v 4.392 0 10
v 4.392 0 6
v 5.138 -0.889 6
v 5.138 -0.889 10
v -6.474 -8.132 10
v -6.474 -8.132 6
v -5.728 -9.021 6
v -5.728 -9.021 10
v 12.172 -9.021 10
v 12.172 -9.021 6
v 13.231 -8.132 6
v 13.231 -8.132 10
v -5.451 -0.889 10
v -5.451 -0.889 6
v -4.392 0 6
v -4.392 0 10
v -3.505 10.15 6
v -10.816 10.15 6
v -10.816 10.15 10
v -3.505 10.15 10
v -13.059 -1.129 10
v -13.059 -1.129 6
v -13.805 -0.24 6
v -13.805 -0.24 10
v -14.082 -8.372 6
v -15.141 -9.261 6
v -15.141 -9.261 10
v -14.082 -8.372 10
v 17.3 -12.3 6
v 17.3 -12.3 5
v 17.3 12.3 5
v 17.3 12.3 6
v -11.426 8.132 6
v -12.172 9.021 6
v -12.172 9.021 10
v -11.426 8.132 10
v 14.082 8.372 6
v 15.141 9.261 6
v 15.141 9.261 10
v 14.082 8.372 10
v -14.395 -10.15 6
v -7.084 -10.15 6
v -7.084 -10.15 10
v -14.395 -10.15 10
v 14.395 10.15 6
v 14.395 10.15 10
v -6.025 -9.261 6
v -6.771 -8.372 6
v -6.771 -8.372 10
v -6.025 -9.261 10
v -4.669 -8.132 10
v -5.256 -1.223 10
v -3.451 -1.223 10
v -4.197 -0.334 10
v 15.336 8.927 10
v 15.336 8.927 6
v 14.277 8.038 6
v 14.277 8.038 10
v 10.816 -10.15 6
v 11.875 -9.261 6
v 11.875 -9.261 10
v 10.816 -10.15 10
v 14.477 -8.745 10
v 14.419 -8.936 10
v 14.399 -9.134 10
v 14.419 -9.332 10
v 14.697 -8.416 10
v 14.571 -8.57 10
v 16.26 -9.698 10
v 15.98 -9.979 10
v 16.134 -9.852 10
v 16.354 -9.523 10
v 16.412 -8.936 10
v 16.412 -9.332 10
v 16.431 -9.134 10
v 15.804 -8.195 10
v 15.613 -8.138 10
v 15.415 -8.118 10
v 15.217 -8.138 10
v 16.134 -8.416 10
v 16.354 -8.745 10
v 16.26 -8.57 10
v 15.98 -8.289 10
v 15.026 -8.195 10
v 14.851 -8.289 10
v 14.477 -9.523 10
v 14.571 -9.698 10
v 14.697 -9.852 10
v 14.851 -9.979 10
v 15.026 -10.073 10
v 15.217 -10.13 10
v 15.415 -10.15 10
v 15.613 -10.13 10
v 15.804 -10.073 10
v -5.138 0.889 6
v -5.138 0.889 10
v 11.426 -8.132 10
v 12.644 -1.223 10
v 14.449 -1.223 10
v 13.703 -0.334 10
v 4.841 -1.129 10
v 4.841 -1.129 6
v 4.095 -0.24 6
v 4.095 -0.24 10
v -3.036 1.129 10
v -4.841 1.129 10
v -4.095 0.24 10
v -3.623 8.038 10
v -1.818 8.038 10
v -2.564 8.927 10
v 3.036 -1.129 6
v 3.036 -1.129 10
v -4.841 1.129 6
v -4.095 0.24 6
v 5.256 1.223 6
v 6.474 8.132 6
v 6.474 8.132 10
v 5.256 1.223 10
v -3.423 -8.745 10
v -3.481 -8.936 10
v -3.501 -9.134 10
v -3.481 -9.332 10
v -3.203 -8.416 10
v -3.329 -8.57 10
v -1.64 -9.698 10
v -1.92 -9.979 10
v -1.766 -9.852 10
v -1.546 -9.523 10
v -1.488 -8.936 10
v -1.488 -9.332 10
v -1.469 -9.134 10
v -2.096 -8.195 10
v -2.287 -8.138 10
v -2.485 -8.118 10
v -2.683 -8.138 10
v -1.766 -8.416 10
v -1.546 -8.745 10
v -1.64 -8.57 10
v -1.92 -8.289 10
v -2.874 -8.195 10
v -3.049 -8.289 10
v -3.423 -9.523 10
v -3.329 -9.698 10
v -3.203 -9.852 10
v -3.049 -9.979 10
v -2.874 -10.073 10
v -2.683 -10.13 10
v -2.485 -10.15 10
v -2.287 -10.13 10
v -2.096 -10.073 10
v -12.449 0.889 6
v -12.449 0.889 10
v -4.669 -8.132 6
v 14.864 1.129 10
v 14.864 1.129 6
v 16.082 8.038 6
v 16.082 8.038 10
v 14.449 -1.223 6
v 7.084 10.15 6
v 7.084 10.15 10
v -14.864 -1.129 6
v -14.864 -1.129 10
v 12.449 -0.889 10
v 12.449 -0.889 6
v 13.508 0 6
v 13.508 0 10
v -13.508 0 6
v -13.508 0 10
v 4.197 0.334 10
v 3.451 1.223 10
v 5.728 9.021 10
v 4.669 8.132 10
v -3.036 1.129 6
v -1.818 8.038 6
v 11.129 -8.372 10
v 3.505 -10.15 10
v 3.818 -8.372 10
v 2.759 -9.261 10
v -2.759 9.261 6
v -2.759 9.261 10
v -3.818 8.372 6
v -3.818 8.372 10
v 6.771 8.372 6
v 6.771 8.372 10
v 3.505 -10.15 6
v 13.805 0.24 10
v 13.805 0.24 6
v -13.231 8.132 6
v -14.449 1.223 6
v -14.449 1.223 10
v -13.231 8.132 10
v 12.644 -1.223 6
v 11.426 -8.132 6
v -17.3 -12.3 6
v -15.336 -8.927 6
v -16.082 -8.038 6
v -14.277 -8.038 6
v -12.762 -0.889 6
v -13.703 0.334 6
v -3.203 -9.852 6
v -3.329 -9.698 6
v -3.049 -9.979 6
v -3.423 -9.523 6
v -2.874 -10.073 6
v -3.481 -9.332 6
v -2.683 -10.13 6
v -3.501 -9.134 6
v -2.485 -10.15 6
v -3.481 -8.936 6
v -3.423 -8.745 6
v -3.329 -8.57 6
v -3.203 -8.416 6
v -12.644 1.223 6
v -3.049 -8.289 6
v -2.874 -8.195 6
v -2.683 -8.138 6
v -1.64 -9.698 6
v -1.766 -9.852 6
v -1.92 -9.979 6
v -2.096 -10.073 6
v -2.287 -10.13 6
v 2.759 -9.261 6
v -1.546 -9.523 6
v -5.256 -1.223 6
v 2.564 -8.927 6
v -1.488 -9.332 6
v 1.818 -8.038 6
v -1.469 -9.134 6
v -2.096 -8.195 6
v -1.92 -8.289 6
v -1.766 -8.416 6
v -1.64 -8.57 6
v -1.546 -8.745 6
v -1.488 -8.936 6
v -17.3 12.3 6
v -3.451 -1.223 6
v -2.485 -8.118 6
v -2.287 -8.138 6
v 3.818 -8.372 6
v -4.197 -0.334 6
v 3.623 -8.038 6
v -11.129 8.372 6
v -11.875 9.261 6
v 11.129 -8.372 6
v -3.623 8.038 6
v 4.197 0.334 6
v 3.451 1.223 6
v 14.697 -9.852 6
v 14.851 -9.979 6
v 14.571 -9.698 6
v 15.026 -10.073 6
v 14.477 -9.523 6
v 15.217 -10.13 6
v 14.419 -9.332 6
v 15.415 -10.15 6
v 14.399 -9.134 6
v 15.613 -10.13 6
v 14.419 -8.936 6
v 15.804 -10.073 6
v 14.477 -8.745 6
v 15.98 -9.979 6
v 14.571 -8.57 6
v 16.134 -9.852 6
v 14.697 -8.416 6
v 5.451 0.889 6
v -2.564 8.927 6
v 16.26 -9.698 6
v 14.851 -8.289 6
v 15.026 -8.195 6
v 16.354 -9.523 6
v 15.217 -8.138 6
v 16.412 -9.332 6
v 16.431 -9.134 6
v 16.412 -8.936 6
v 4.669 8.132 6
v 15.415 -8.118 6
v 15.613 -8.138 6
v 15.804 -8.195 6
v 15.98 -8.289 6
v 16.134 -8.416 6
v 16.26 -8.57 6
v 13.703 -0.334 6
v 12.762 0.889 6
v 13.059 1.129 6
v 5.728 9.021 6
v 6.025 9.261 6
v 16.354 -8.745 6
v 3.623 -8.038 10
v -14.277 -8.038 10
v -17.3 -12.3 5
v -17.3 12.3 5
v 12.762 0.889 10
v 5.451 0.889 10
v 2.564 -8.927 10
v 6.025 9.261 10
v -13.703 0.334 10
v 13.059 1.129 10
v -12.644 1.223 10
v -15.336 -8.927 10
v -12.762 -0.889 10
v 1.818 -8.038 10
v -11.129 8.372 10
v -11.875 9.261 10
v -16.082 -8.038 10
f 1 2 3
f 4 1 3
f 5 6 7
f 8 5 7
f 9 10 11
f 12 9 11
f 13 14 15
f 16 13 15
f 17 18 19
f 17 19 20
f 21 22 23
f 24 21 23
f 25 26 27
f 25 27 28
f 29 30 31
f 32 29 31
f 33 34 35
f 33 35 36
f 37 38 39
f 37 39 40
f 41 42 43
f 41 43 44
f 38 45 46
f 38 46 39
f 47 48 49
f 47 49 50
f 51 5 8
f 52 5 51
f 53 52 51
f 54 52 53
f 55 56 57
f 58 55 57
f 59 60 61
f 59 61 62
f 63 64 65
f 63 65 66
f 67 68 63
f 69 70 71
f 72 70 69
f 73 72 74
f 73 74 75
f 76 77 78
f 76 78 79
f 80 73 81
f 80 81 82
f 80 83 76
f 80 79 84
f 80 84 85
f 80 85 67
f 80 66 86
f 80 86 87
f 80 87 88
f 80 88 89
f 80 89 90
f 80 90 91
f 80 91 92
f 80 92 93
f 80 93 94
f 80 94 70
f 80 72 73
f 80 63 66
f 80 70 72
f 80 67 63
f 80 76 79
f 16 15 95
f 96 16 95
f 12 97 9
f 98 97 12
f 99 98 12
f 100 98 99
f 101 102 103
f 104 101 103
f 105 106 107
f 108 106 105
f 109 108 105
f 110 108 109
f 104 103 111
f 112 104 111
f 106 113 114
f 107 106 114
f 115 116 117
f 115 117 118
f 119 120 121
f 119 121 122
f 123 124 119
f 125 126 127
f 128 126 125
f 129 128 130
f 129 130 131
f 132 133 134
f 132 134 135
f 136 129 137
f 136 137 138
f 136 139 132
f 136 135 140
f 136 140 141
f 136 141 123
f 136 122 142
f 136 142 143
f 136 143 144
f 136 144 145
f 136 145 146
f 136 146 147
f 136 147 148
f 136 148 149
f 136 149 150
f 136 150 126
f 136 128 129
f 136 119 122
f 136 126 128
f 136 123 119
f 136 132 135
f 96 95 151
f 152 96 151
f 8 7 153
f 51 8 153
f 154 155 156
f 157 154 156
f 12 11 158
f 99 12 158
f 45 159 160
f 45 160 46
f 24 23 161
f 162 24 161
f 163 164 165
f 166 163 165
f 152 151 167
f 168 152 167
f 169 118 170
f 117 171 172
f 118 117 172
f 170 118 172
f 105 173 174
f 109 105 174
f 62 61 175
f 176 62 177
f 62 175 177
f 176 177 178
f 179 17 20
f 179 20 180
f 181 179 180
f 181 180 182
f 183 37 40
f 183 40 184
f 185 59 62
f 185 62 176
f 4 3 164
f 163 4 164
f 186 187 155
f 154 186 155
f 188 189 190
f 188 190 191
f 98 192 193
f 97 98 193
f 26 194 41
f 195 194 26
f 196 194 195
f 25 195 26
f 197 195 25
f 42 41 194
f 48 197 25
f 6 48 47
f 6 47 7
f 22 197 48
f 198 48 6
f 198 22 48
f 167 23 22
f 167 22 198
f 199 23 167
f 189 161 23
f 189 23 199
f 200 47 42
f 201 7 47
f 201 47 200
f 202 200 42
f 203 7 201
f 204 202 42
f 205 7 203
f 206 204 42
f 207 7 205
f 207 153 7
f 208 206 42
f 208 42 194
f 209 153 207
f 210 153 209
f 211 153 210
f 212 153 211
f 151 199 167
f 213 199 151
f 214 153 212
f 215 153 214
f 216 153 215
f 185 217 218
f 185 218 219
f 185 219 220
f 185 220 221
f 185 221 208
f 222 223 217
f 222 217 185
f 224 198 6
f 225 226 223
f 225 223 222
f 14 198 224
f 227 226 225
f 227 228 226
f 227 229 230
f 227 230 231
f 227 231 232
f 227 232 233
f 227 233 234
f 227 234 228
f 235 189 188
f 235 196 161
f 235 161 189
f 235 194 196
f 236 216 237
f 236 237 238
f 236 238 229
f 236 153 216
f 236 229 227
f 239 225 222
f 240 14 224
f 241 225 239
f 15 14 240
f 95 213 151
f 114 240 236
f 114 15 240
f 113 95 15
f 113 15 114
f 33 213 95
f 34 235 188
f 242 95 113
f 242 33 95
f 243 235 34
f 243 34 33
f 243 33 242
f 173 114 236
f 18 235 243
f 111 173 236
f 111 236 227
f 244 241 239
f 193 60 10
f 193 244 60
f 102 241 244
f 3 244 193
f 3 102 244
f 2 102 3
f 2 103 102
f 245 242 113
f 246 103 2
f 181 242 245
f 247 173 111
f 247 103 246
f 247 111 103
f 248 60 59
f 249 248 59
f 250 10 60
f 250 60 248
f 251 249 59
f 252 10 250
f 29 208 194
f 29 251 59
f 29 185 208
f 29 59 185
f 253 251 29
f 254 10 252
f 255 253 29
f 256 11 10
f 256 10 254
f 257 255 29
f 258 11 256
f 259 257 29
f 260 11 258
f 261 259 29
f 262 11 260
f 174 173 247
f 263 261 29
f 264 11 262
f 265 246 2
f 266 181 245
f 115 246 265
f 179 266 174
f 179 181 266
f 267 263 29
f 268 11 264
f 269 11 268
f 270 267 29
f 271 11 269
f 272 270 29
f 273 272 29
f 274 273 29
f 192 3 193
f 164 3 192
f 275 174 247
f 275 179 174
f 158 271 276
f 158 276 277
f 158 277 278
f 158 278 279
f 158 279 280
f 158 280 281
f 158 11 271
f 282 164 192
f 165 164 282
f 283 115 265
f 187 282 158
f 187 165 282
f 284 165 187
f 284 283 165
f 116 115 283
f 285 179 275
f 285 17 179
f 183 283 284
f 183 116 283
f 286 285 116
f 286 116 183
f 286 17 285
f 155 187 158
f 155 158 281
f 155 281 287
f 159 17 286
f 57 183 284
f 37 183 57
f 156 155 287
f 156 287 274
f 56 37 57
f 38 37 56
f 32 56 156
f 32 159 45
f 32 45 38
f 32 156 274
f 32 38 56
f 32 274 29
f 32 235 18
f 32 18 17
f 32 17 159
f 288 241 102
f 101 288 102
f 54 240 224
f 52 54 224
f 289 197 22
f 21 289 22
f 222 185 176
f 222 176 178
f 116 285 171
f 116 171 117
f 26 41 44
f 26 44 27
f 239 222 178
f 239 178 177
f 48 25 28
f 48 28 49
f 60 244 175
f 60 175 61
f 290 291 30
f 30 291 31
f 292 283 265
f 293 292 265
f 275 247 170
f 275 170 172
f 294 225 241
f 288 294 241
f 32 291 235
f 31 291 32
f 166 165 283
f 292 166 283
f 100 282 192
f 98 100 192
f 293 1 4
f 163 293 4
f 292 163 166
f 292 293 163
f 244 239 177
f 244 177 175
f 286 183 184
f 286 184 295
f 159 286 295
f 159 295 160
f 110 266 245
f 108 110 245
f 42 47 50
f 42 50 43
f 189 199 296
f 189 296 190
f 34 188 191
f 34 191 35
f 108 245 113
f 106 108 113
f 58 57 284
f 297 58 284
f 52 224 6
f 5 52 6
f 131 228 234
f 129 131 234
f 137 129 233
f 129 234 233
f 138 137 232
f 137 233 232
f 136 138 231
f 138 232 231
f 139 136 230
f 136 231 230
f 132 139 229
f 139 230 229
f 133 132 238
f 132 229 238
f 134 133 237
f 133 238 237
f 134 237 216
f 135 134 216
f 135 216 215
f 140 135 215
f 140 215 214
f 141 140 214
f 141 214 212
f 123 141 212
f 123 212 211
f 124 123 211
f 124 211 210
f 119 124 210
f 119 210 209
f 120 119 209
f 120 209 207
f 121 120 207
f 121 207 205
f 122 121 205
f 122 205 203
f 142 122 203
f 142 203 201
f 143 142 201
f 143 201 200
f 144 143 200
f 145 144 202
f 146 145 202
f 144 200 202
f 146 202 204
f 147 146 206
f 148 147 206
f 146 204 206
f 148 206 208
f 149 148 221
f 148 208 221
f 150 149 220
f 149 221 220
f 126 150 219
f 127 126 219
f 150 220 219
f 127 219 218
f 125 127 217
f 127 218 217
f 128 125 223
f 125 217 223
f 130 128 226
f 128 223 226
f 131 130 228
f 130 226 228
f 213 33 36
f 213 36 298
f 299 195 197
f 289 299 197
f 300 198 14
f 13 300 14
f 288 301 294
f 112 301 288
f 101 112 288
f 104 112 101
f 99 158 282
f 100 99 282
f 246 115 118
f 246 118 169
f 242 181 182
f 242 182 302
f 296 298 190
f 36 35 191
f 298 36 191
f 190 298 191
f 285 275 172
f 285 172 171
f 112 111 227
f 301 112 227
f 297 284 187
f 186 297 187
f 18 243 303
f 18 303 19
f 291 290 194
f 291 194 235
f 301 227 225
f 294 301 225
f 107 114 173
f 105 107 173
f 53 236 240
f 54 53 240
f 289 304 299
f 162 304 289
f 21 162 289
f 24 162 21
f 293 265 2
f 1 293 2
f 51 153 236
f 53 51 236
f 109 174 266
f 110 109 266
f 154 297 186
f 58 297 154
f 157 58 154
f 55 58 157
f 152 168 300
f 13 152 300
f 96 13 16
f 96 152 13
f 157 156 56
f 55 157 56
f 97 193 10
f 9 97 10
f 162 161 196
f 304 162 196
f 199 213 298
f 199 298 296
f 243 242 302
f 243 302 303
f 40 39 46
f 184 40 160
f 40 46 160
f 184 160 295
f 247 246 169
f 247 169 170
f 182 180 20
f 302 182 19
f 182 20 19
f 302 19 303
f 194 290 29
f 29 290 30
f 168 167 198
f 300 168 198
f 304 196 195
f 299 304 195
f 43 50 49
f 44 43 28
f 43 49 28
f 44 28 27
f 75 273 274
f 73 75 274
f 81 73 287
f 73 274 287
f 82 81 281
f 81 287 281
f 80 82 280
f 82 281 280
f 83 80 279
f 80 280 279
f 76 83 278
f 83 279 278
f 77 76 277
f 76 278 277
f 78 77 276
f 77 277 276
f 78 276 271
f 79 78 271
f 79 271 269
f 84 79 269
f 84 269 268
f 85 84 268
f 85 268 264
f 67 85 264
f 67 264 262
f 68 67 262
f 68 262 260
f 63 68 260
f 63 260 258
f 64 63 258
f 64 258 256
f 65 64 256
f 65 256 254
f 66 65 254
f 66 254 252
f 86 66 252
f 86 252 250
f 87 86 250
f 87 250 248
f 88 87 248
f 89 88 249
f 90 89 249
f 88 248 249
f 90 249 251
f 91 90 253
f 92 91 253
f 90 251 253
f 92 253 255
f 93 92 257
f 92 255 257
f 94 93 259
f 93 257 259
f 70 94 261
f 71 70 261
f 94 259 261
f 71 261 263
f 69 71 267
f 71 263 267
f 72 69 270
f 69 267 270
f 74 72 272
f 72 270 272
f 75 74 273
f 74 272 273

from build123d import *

# Parameters (mm, degrees)
SKETCH_W            = 34.6
SKETCH_H            = 24.6
PAD001_DEPTH        = 1
SKETCH002_R         = 1.016
PAD002_DEPTH        = 5
LINEARPATTERN_COUNT = 2
LINEARPATTERN_PITCH = 17.9


with BuildPart() as part:
    # Sketch → Pad001 (new body)
    with BuildSketch(Plane.XY):
        Rectangle(SKETCH_W, SKETCH_H)
    extrude(amount=PAD001_DEPTH)

    # Sketch002 → Pad002 (join)
    with BuildSketch(Plane.XY):
        with Locations((-2.484719, -9.134)):
            Circle(SKETCH002_R)
        Polygon((-11.875322, 9.261), (-10.815853, 10.15), (-3.50471, 10.15), (-2.75875, 9.261), (-3.818219, 8.372), (-11.129362, 8.372), align=None)
        Polygon((-12.171581, 9.021337), (-11.425621, 8.132337), (-12.643997, 1.222585), (-13.703466, 0.333585), (-14.449425, 1.222585), (-13.23105, 8.132337), align=None)
        Polygon((-2.56357, 8.927415), (-3.623039, 8.038415), (-4.841415, 1.128663), (-4.095455, 0.239663), (-3.035986, 1.128663), (-1.81761, 8.038415), align=None)
        Polygon((-12.448817, 0.889), (-13.508286, 0), (-12.762326, -0.889), (-5.451183, -0.889), (-4.391714, 0), (-5.137674, 0.889), align=None)
        Polygon((-13.804545, -0.239663), (-14.864014, -1.128663), (-16.08239, -8.038415), (-15.33643, -8.927415), (-14.276961, -8.038415), (-13.058585, -1.128663), align=None)
        Polygon((-4.196534, -0.333585), (-5.256003, -1.222585), (-6.474379, -8.132337), (-5.728419, -9.021337), (-4.66895, -8.132337), (-3.450575, -1.222585), align=None)
        Polygon((-15.14125, -9.261), (-14.081781, -8.372), (-6.770638, -8.372), (-6.024678, -9.261), (-7.084147, -10.15), (-14.39529, -10.15), align=None)
    pad002 = extrude(amount=PAD002_DEPTH)

    # LinearPattern: Pad002 ×2
    with Locations(*[(i * LINEARPATTERN_PITCH, 0, 0) for i in range(1, LINEARPATTERN_COUNT)]):
        add(pad002)


with BuildPart() as part_1:
    # Body001 placement: moved
    add(part.part.moved(Location((0, 0, 5))))


solid = part_1.part
